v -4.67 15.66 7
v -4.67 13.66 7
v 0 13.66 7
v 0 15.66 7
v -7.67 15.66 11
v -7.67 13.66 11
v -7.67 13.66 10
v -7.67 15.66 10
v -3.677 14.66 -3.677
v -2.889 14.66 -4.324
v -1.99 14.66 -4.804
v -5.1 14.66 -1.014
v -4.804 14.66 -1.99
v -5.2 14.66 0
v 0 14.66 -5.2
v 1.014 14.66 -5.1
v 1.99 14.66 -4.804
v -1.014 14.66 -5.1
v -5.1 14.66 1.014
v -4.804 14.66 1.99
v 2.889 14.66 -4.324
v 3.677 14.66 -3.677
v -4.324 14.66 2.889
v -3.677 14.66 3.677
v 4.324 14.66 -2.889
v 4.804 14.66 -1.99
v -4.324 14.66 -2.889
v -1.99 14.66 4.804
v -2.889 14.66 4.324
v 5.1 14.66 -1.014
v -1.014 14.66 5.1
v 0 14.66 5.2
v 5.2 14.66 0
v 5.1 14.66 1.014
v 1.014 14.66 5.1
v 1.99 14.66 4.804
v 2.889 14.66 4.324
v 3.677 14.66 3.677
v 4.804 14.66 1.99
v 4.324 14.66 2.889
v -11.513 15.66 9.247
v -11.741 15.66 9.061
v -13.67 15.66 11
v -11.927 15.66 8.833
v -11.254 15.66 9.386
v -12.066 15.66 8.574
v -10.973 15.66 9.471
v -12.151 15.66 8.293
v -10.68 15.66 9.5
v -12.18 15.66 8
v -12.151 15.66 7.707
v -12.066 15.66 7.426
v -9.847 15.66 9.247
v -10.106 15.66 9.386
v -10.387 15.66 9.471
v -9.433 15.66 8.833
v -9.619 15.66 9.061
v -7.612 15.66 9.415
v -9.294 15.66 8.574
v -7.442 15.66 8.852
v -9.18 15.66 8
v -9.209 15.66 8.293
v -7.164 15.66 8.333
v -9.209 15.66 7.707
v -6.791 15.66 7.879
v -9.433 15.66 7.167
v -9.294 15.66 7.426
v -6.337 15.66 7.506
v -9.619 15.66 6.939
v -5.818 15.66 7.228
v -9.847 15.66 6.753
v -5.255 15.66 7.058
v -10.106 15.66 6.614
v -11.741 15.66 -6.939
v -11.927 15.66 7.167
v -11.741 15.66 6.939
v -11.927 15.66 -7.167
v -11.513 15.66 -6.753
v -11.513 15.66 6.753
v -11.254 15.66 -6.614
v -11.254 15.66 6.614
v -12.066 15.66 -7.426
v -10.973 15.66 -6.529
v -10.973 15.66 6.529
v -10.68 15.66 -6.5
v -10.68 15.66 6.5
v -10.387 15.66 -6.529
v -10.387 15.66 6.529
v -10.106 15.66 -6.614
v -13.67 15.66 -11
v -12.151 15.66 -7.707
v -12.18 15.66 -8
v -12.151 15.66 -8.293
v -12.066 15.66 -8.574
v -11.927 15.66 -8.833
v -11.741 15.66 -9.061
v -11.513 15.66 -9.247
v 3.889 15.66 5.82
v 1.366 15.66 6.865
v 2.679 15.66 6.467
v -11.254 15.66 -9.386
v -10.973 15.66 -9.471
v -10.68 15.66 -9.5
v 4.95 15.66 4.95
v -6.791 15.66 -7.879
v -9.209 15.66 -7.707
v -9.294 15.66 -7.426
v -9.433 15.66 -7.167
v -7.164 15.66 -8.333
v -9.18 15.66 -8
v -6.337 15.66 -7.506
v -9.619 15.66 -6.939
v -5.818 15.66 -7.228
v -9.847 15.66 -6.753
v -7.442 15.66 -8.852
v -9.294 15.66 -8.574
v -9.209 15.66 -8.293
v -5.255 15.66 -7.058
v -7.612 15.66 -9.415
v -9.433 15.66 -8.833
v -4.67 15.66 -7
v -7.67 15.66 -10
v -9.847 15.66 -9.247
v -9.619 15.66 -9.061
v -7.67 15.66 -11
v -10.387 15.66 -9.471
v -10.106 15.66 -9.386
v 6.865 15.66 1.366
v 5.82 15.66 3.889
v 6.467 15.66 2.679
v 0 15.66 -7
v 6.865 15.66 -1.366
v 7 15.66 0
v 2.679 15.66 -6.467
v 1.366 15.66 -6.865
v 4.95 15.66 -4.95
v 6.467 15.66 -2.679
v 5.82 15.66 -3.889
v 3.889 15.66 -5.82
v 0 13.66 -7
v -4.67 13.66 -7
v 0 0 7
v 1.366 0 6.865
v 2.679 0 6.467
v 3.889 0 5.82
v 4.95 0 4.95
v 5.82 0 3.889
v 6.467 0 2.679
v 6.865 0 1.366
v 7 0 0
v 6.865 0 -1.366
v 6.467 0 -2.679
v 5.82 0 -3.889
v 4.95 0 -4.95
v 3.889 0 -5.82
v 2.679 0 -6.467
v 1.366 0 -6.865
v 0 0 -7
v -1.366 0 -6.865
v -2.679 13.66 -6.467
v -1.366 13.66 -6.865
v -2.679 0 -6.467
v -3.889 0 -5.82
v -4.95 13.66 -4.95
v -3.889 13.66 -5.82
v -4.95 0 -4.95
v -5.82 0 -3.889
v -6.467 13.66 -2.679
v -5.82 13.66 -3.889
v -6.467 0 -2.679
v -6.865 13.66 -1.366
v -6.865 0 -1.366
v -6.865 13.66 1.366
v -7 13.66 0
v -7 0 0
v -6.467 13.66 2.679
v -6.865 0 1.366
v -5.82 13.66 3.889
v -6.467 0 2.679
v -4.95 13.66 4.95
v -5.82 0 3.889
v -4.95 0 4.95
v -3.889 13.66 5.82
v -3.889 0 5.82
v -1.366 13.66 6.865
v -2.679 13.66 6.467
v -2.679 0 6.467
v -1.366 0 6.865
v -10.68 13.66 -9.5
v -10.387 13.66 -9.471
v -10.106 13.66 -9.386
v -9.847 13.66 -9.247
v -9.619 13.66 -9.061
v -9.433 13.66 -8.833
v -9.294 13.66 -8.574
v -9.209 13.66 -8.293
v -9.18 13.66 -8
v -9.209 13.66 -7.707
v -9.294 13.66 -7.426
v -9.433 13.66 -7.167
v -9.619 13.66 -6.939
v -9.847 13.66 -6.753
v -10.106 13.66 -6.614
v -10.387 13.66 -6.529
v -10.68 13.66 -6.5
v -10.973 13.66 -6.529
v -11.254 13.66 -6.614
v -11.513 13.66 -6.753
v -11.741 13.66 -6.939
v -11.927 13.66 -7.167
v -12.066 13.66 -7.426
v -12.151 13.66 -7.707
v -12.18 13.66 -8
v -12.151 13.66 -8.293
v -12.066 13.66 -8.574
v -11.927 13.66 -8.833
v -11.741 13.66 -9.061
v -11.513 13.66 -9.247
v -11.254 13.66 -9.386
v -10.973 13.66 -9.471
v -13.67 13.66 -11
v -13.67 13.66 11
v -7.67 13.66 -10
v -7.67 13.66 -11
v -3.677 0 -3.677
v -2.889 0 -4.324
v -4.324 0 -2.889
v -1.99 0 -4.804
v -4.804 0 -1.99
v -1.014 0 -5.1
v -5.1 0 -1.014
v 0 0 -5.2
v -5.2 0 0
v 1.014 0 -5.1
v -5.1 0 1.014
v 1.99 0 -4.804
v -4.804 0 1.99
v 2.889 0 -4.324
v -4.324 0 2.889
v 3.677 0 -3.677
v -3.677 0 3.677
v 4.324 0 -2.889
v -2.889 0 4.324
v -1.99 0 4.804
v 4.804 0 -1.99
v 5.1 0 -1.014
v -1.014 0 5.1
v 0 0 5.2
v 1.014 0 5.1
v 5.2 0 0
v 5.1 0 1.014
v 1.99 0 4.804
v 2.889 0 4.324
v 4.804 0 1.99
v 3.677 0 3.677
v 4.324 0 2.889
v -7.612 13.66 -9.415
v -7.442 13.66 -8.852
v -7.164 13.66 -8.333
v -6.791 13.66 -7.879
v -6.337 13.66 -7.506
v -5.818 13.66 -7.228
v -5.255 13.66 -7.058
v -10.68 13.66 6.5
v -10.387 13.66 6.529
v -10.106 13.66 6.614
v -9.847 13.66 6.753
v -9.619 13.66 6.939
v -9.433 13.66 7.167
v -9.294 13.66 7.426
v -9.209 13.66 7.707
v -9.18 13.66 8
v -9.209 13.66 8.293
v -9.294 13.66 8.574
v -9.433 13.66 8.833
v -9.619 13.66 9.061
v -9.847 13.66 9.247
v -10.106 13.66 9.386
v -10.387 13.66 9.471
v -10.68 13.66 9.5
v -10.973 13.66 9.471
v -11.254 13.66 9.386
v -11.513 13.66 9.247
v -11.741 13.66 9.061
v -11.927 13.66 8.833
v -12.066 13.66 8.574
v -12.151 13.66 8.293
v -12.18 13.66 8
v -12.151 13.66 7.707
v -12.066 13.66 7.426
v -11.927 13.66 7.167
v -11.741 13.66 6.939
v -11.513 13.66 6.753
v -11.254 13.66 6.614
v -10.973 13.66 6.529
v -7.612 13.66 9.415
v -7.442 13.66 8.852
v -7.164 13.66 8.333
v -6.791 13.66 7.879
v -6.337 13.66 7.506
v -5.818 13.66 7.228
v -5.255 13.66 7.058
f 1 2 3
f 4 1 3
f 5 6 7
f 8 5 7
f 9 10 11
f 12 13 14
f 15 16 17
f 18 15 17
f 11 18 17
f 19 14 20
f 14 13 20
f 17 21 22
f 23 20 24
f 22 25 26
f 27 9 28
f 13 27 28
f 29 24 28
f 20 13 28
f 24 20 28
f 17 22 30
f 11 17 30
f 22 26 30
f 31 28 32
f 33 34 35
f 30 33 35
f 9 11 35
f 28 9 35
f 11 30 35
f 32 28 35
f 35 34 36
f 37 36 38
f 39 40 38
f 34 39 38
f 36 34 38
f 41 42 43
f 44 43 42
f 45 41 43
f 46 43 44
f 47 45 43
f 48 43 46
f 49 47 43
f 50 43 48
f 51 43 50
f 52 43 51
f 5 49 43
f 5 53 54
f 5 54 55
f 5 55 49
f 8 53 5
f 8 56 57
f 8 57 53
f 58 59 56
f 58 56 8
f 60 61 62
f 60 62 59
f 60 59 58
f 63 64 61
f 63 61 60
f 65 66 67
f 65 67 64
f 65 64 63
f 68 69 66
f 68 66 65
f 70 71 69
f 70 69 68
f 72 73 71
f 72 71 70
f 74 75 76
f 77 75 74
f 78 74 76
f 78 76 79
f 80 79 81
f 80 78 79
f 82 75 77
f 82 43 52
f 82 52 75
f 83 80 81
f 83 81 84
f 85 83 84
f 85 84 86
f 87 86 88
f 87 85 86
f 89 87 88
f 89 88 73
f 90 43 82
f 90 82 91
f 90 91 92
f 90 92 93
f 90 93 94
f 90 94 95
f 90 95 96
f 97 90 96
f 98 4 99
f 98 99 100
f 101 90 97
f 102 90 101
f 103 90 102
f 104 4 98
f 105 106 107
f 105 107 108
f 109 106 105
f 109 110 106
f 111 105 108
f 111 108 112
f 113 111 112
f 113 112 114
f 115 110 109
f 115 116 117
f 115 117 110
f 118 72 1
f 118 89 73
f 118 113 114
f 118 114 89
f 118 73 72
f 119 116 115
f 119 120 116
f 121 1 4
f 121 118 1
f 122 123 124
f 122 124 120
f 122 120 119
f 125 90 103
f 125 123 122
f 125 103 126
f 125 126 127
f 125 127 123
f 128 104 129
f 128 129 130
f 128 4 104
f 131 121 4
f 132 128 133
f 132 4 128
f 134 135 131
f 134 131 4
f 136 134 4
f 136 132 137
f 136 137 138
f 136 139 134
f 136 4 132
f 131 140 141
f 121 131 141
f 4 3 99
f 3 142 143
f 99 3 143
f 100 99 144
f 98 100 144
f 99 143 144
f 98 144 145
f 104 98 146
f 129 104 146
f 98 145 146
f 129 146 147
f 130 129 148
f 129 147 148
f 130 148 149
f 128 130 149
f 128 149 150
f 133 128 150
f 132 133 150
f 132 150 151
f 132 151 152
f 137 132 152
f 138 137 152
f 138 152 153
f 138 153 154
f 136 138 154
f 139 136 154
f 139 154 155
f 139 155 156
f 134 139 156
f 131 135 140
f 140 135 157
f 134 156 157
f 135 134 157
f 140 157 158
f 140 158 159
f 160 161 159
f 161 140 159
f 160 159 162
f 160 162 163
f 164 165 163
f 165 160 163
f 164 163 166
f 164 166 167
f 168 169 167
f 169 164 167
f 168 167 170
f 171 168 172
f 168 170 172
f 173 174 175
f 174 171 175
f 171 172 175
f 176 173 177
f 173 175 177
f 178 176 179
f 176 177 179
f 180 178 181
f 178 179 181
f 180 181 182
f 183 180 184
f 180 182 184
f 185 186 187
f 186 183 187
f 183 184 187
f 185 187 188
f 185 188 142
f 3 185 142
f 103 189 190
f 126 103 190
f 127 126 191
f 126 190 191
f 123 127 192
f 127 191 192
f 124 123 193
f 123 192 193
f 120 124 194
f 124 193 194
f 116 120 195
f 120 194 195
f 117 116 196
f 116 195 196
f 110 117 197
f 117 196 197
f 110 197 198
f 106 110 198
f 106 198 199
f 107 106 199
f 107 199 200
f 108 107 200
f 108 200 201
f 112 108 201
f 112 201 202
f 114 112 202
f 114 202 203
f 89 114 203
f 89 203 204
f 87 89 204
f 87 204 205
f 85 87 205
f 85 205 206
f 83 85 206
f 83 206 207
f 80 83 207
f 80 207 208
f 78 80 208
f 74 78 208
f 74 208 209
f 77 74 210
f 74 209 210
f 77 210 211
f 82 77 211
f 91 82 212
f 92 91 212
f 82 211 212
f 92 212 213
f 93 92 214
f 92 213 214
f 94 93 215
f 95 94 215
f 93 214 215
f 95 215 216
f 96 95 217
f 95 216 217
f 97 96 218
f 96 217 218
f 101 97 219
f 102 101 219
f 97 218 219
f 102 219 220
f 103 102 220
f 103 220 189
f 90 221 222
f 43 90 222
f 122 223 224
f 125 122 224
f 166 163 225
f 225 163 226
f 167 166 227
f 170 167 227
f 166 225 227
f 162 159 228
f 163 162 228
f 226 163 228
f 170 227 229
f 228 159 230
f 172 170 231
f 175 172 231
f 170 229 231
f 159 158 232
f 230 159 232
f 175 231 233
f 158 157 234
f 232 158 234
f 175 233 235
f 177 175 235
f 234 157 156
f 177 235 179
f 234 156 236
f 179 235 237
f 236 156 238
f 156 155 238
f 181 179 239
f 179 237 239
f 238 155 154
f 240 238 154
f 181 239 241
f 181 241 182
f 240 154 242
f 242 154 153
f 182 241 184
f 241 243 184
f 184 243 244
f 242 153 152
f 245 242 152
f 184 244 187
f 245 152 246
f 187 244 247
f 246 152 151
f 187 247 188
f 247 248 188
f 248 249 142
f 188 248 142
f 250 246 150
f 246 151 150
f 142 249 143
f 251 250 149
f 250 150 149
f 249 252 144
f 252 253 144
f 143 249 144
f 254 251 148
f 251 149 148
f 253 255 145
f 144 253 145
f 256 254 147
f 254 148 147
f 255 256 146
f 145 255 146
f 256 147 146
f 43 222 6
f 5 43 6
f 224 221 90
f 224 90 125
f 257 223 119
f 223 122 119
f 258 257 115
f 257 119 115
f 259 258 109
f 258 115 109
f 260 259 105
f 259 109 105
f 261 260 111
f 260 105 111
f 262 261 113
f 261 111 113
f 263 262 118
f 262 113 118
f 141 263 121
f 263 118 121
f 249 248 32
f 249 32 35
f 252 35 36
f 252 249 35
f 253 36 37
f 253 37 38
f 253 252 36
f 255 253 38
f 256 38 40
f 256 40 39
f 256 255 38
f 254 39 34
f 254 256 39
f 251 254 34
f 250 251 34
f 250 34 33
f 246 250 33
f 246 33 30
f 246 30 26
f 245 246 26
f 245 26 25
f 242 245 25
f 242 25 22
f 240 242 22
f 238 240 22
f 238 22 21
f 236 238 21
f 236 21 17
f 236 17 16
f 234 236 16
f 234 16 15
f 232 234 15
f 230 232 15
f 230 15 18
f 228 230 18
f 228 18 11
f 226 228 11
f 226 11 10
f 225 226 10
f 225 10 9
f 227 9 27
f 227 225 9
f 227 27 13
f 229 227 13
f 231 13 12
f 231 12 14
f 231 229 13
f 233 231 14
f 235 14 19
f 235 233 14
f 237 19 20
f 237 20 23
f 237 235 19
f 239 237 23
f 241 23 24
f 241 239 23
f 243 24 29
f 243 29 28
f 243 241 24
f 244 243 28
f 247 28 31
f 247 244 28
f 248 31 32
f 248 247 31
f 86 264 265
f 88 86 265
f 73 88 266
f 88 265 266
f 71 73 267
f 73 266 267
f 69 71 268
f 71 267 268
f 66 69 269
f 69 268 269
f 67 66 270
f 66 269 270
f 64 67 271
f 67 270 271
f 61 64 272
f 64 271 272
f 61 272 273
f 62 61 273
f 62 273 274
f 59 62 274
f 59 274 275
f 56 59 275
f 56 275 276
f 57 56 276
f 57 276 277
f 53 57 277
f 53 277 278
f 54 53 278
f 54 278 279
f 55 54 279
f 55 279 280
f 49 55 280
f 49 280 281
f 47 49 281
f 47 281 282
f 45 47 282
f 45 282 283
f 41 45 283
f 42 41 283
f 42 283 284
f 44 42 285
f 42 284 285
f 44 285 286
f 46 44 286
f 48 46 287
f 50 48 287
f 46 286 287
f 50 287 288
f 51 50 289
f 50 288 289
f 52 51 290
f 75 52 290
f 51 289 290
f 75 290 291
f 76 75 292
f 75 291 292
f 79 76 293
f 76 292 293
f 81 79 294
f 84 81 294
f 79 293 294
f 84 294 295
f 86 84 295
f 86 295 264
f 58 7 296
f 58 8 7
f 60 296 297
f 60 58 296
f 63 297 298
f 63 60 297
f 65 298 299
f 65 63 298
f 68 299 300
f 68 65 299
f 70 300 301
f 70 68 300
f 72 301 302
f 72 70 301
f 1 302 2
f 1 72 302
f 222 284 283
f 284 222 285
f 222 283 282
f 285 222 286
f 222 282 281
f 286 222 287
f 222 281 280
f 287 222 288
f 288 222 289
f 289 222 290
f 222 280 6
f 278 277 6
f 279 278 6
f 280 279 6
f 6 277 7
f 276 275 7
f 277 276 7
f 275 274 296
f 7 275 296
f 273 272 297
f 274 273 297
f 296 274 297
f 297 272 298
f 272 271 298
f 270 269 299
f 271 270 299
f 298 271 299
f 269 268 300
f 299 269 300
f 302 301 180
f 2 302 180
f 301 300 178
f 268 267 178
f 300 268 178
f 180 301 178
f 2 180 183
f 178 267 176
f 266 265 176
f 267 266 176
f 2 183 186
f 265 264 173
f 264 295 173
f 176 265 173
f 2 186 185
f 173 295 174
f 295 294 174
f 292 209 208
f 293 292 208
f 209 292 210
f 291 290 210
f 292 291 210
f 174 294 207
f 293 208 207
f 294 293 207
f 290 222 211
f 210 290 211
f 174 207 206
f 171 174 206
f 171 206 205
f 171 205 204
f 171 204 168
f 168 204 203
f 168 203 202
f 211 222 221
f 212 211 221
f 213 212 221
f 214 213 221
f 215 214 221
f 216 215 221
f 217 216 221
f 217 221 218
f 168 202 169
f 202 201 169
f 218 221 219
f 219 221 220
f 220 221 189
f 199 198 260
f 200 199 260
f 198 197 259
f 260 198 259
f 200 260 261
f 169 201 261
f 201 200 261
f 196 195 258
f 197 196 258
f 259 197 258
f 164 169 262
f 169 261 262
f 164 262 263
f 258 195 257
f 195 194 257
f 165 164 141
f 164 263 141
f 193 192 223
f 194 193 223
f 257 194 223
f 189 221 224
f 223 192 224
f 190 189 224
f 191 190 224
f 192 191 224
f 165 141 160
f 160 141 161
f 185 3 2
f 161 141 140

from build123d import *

# Parameters (mm, degrees)
SKETCH1_R           = 7
SKETCH1_R_2         = 5.2
BOSS_EXTRUDE1_DEPTH = 15.66
BOSS_EXTRUDE2_START = -2
SKETCH2_W           = 6
SKETCH2_H           = 4
BOSS_EXTRUDE2_DEPTH = 2
SKETCH4_R           = 1.5
CUT_EXTRUDE1_DEPTH  = 10
FILLET1_R           = 3
BOSS_EXTRUDE3_START = -1
SKETCH5_R           = 5.2
BOSS_EXTRUDE3_DEPTH = 1


with BuildPart() as part:
    # Sketch1 → Boss-Extrude1 (new body)
    with BuildSketch(Plane(origin=(0, 0, 0), x_dir=(1, 0, 0), z_dir=(0, 1, 0))):
        with Locations(Location((0, 0, 0), (0, 0, 270))):
            Circle(SKETCH1_R)
        with Locations(Location((0, 0, 0), (0, 0, 270))):
            Circle(SKETCH1_R_2, mode=Mode.SUBTRACT)
    extrude(amount=BOSS_EXTRUDE1_DEPTH)

    # Sketch2 → Boss-Extrude2 (add)
    with BuildSketch(Plane(origin=(0, 15.66, 0), x_dir=(1, 0, 0), z_dir=(0, 1, 0)).offset(BOSS_EXTRUDE2_START)):
        with Locations((-10.67, -9)):
            Rectangle(SKETCH2_W, SKETCH2_H)
        with BuildLine():
            ThreePointArc((0, -7), (-7, 0), (0, 7))
            Line((0, 7), (-7.67, 7))
            Line((-7.67, 7), (-13.67, 7))
            Line((-13.67, 7), (-13.67, -7))
            Line((-13.67, -7), (-7.67, -7))
            Line((-7.67, -7), (0, -7))
        make_face()
        with Locations((-10.67, 9)):
            Rectangle(SKETCH2_W, SKETCH2_H)
    extrude(amount=BOSS_EXTRUDE2_DEPTH)

    # Sketch4 → Cut-Extrude1 (cut)
    with BuildSketch(Plane.XZ.offset(-13.66)):
        with Locations(Location((-10.68, -8, 0), (0, 0, 270))):
            Circle(SKETCH4_R)
        with Locations(Location((-10.68, 8, 0), (0, 0, 270))):
            Circle(SKETCH4_R)
    extrude(amount=-CUT_EXTRUDE1_DEPTH, mode=Mode.SUBTRACT)

    # Fillet1
    fillet1_edges = [part.edges().sort_by_distance(p)[0] for p in [
        (-7.67, 14.66, 7),
        (-7.67, 14.66, -7),
    ]]
    fillet(fillet1_edges, radius=FILLET1_R)

    # Sketch5 → Boss-Extrude3 (add)
    with BuildSketch(Plane(origin=(0, 15.66, 0), x_dir=(1, 0, 0), z_dir=(0, 1, 0)).offset(BOSS_EXTRUDE3_START)):
        with Locations(Location((0, 0, 0), (0, 0, 270))):
            Circle(SKETCH5_R)
    extrude(amount=BOSS_EXTRUDE3_DEPTH)


solid = part.part
